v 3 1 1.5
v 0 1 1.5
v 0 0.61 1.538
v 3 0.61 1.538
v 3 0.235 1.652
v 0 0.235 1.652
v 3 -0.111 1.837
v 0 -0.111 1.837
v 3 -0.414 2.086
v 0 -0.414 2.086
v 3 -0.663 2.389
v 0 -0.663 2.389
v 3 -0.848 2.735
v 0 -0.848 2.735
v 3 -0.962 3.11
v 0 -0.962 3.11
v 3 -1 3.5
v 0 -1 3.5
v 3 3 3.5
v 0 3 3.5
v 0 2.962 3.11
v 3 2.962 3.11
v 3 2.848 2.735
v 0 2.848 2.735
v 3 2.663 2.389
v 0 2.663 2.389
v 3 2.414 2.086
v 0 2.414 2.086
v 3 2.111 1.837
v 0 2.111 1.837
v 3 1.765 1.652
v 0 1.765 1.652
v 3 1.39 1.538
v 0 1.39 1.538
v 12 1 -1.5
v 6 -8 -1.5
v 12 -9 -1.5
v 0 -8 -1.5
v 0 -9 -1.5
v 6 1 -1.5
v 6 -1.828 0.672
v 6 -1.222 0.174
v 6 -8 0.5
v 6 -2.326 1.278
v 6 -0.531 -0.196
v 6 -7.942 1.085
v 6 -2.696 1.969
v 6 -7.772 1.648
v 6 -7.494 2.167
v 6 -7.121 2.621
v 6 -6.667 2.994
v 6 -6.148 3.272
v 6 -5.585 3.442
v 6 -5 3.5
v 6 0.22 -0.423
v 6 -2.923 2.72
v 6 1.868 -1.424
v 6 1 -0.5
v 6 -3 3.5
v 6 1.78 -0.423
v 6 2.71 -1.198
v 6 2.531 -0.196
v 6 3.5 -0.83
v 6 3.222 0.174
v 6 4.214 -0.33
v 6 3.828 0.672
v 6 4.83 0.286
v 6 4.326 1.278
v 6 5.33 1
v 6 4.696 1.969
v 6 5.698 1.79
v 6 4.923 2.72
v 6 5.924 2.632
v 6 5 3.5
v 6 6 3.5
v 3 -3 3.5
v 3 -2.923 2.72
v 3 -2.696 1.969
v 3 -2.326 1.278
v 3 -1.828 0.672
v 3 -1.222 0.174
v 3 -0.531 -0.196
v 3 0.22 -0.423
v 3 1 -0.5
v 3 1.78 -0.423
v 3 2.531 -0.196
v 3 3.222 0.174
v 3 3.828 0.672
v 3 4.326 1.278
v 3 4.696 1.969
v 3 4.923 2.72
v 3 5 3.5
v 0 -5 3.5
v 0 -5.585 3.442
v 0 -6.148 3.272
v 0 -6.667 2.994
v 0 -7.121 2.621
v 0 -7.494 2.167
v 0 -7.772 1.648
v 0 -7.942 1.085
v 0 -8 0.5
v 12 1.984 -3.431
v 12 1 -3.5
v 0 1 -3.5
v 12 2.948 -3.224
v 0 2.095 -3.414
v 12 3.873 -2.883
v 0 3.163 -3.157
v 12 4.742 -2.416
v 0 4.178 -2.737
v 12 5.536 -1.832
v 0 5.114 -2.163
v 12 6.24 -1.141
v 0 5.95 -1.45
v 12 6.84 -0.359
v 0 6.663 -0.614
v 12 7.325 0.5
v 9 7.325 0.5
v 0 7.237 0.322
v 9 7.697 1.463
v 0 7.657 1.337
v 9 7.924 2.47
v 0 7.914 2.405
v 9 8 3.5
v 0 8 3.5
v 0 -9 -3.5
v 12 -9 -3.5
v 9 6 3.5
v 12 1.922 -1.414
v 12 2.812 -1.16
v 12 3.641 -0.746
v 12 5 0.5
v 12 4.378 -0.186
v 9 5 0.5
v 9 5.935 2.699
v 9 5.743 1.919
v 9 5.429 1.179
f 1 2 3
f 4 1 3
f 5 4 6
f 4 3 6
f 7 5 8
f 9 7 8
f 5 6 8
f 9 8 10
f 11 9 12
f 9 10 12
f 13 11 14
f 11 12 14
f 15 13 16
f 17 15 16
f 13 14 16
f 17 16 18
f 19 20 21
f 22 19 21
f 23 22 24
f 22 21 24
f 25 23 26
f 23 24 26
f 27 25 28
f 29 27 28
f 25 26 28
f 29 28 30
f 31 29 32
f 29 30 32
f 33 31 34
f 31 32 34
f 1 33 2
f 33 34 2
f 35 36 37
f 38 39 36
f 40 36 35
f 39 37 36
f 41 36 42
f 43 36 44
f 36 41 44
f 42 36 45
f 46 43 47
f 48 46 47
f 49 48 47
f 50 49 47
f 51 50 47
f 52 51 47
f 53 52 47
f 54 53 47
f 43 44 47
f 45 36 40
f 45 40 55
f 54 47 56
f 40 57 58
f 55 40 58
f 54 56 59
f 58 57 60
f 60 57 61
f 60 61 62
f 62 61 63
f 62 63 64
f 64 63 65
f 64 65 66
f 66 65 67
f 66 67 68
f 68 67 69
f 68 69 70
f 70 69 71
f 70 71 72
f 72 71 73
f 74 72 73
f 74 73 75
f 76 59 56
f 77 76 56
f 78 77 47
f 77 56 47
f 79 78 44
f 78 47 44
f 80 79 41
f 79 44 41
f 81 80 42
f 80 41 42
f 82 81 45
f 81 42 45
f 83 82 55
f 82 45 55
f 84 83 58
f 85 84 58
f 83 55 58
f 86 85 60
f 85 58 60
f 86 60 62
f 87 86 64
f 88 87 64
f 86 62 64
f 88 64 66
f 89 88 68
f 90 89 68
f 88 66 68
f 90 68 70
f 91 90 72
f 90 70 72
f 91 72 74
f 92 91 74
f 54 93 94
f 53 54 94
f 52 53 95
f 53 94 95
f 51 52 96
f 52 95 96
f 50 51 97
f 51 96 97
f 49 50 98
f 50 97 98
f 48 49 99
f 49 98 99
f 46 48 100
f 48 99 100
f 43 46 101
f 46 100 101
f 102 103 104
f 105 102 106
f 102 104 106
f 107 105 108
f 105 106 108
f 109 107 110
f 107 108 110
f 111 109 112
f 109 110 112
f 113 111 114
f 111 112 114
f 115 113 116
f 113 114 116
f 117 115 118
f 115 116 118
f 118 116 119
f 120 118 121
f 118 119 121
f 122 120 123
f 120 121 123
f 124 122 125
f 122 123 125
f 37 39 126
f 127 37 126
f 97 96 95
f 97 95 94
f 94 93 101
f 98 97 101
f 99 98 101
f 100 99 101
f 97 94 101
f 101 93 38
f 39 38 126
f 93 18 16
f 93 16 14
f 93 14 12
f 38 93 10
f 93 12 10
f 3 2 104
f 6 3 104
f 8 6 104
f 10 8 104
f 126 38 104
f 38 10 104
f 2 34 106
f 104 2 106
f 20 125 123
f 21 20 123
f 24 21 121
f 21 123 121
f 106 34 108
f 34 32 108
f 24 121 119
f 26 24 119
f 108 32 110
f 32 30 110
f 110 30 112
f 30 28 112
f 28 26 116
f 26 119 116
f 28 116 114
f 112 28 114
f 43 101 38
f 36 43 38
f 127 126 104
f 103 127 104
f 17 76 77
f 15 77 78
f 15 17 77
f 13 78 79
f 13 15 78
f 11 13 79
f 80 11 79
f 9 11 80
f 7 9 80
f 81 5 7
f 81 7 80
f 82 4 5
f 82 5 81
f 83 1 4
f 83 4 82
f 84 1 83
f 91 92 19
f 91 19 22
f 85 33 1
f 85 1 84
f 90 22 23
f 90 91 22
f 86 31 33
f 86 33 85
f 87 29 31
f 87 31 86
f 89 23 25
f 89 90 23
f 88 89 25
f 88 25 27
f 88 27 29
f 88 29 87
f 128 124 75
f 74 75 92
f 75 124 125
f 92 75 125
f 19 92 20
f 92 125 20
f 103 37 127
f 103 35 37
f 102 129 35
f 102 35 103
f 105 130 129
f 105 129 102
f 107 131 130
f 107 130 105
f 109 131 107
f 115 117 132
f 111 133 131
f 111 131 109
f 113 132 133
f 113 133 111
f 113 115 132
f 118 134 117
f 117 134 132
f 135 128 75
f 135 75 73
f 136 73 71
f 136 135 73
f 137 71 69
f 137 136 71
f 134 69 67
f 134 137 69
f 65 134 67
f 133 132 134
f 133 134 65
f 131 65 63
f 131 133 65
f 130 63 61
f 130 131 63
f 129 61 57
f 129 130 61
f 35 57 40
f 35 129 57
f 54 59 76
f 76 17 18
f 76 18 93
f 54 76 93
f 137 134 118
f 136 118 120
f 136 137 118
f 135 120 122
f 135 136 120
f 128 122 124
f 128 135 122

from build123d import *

# Parameters (mm, degrees)
SKETCH1_W           = 2
SKETCH1_H           = 1
BOSS_EXTRUDE1_DEPTH = 12
SKETCH2_W           = 3
SKETCH2_H           = 3
CUT_EXTRUDE1_DEPTH  = 22
CUT_EXTRUDE2_DEPTH  = 6
SKETCH4_R           = 4
CUT_EXTRUDE3_DEPTH  = 3


with BuildPart() as part:
    # Sketch1 → Boss-Extrude1 (new body)
    with BuildSketch(Plane(origin=(0, 0, 0), x_dir=(0, 0, -1), z_dir=(1, 0, 0))):
        with BuildLine():
            Line((1.5, -8), (3.5, -8))
            Line((3.5, -8), (3.5, 1))
            ThreePointArc((3.5, 1), (1.449747468, 5.949747468), (-3.5, 8))
            Line((-3.5, 8), (-3.5, 3))
            ThreePointArc((-3.5, 3), (-2.085786438, 2.414213562), (-1.5, 1))
            ThreePointArc((-1.5, 1), (-2.085786438, -0.414213562), (-3.5, -1))
            Line((-3.5, -1), (-3.5, -5))
            ThreePointArc((-3.5, -5), (-2.621320344, -7.121320344), (-0.5, -8))
            Line((-0.5, -8), (1.5, -8))
        make_face()
        with Locations((2.5, -8.5)):
            Rectangle(SKETCH1_W, SKETCH1_H)
    extrude(amount=BOSS_EXTRUDE1_DEPTH)

    # Sketch2 → Cut-Extrude1 (cut)
    with BuildSketch(Plane.XZ.offset(9)):
        with Locations((10.5, 2)):
            Rectangle(SKETCH2_W, SKETCH2_H)
    extrude(amount=-CUT_EXTRUDE1_DEPTH, mode=Mode.SUBTRACT)

    # Sketch3 → Cut-Extrude2 (cut)
    with BuildSketch(Plane(origin=(12, 0, 0), x_dir=(0, 0, -1), z_dir=(1, 0, 0))):
        with BuildLine():
            Line((1.5, 1), (1.5, -8.778964662))
            ThreePointArc((1.5, -8.778964662), (-3.5, -13.778964662), (-8.5, -8.778964662))
            Line((-8.5, -8.778964662), (-8.5, 1))
            ThreePointArc((-8.5, 1), (-3.5, 6), (1.5, 1))
        make_face()
    extrude(amount=-CUT_EXTRUDE2_DEPTH, mode=Mode.SUBTRACT)

    # Sketch4 → Cut-Extrude3 (cut)
    with BuildSketch(Plane(origin=(6, 0, 0), x_dir=(0, 0, -1), z_dir=(1, 0, 0))):
        with Locations((-3.5, 1)):
            Circle(SKETCH4_R)
    extrude(amount=-CUT_EXTRUDE3_DEPTH, mode=Mode.SUBTRACT)


solid = part.part
